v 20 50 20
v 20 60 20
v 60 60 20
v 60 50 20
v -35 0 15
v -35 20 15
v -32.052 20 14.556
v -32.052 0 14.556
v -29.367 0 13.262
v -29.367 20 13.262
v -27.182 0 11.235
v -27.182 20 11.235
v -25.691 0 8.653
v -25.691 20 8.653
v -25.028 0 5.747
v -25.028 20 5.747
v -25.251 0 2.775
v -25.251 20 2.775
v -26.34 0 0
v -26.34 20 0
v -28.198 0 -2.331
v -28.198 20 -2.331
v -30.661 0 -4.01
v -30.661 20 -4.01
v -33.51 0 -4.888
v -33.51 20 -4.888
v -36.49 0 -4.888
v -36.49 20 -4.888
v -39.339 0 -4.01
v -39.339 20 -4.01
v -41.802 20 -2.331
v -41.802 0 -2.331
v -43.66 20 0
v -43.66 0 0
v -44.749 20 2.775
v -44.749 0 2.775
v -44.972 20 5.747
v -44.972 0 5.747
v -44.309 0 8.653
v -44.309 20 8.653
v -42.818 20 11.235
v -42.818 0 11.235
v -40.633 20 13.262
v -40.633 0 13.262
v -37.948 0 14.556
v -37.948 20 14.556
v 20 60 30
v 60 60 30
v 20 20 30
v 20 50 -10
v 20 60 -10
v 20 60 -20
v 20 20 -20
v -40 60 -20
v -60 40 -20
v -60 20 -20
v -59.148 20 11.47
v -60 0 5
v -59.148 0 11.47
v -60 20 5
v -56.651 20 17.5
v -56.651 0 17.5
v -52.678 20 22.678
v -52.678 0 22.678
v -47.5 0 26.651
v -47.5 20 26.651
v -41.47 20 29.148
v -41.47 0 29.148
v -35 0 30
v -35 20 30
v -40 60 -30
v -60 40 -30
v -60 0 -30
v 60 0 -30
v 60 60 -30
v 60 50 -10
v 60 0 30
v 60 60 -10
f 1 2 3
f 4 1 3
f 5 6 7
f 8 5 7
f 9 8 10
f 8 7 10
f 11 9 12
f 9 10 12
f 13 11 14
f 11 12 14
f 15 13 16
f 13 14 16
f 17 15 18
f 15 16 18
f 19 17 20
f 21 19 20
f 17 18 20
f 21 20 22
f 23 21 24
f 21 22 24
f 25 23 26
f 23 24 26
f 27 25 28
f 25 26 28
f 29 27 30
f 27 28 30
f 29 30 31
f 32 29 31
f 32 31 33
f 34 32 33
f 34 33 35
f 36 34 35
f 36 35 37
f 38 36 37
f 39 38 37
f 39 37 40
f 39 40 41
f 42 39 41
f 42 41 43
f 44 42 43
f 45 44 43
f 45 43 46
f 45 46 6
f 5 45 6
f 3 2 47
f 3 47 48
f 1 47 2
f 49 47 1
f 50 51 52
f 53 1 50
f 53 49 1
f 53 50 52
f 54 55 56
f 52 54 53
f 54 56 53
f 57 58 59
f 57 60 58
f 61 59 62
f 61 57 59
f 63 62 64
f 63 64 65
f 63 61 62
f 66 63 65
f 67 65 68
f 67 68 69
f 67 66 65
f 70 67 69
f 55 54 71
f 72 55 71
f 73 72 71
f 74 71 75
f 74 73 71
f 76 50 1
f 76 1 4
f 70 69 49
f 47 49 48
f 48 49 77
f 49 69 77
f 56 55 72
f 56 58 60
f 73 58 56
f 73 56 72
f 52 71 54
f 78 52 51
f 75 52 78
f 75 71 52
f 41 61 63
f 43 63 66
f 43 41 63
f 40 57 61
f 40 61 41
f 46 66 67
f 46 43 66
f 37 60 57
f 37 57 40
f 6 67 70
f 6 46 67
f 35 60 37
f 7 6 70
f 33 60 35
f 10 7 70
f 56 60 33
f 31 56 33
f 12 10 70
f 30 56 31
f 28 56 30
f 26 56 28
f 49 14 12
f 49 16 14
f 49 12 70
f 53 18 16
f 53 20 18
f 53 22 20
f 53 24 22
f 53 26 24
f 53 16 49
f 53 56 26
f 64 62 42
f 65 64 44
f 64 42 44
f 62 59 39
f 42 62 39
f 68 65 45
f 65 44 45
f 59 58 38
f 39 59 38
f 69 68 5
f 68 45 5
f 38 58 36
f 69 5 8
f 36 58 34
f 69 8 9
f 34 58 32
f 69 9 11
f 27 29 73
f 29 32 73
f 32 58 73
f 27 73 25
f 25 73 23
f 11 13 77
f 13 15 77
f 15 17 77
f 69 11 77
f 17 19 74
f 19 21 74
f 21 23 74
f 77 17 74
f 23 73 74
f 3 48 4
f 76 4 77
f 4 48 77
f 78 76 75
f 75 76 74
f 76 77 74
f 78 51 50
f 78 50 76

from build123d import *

# Parameters (mm, degrees)
SKETCH1_W           = 120
SKETCH1_H           = 60
BOSS_EXTRUDE1_DEPTH = 20
SKETCH2_W           = 120
SKETCH2_H           = 10
BOSS_EXTRUDE2_DEPTH = 40
CHAMFER1_SIZE       = 20
FILLET1_R           = 25
SKETCH4_W           = 40
SKETCH4_H           = 50
BOSS_EXTRUDE5_DEPTH = 40
SKETCH5_W           = 40
SKETCH5_H           = 30
CUT_EXTRUDE1_DEPTH  = 10
SKETCH6_R           = 10
CUT_EXTRUDE2_DEPTH  = 79.102496759


with BuildPart() as part:
    # Sketch1 → Boss-Extrude1 (new body)
    with BuildSketch(Plane(origin=(0, 0, 0), x_dir=(1, 0, 0), z_dir=(0, 1, 0))):
        Rectangle(SKETCH1_W, SKETCH1_H)
    extrude(amount=BOSS_EXTRUDE1_DEPTH)

    # Sketch2 → Boss-Extrude2 (add)
    with BuildSketch(Plane(origin=(0, 20, 0), x_dir=(1, 0, 0), z_dir=(0, 1, 0))):
        with Locations((0, 25)):
            Rectangle(SKETCH2_W, SKETCH2_H)
    extrude(amount=BOSS_EXTRUDE2_DEPTH)

    # Chamfer1
    chamfer1_edges = [part.edges().sort_by_distance(p)[0] for p in [
        (-60, 60, -25),
    ]]
    chamfer(chamfer1_edges, length=CHAMFER1_SIZE)

    # Fillet1
    fillet1_edges = [part.edges().sort_by_distance(p)[0] for p in [
        (-60, 10, 30),
    ]]
    fillet(fillet1_edges, radius=FILLET1_R)

    # Sketch4 → Boss-Extrude5 (add)
    with BuildSketch(Plane(origin=(0, 20, 0), x_dir=(1, 0, 0), z_dir=(0, 1, 0))):
        with Locations((40, -5)):
            Rectangle(SKETCH4_W, SKETCH4_H)
    extrude(amount=BOSS_EXTRUDE5_DEPTH)

    # Sketch5 → Cut-Extrude1 (cut)
    with BuildSketch(Plane(origin=(0, 60, 0), x_dir=(1, 0, 0), z_dir=(0, 1, 0))):
        with Locations((40, -5)):
            Rectangle(SKETCH5_W, SKETCH5_H)
    extrude(amount=-CUT_EXTRUDE1_DEPTH, mode=Mode.SUBTRACT)

    # Sketch6 → Cut-Extrude2 (cut, through all)
    with BuildSketch(Plane(origin=(0, 20, 0), x_dir=(1, 0, 0), z_dir=(0, 1, 0))):
        with Locations(Location((-35, -5, 0), (0, 0, 270))):
            Circle(SKETCH6_R)
    extrude(amount=-CUT_EXTRUDE2_DEPTH, mode=Mode.SUBTRACT)


solid = part.part
